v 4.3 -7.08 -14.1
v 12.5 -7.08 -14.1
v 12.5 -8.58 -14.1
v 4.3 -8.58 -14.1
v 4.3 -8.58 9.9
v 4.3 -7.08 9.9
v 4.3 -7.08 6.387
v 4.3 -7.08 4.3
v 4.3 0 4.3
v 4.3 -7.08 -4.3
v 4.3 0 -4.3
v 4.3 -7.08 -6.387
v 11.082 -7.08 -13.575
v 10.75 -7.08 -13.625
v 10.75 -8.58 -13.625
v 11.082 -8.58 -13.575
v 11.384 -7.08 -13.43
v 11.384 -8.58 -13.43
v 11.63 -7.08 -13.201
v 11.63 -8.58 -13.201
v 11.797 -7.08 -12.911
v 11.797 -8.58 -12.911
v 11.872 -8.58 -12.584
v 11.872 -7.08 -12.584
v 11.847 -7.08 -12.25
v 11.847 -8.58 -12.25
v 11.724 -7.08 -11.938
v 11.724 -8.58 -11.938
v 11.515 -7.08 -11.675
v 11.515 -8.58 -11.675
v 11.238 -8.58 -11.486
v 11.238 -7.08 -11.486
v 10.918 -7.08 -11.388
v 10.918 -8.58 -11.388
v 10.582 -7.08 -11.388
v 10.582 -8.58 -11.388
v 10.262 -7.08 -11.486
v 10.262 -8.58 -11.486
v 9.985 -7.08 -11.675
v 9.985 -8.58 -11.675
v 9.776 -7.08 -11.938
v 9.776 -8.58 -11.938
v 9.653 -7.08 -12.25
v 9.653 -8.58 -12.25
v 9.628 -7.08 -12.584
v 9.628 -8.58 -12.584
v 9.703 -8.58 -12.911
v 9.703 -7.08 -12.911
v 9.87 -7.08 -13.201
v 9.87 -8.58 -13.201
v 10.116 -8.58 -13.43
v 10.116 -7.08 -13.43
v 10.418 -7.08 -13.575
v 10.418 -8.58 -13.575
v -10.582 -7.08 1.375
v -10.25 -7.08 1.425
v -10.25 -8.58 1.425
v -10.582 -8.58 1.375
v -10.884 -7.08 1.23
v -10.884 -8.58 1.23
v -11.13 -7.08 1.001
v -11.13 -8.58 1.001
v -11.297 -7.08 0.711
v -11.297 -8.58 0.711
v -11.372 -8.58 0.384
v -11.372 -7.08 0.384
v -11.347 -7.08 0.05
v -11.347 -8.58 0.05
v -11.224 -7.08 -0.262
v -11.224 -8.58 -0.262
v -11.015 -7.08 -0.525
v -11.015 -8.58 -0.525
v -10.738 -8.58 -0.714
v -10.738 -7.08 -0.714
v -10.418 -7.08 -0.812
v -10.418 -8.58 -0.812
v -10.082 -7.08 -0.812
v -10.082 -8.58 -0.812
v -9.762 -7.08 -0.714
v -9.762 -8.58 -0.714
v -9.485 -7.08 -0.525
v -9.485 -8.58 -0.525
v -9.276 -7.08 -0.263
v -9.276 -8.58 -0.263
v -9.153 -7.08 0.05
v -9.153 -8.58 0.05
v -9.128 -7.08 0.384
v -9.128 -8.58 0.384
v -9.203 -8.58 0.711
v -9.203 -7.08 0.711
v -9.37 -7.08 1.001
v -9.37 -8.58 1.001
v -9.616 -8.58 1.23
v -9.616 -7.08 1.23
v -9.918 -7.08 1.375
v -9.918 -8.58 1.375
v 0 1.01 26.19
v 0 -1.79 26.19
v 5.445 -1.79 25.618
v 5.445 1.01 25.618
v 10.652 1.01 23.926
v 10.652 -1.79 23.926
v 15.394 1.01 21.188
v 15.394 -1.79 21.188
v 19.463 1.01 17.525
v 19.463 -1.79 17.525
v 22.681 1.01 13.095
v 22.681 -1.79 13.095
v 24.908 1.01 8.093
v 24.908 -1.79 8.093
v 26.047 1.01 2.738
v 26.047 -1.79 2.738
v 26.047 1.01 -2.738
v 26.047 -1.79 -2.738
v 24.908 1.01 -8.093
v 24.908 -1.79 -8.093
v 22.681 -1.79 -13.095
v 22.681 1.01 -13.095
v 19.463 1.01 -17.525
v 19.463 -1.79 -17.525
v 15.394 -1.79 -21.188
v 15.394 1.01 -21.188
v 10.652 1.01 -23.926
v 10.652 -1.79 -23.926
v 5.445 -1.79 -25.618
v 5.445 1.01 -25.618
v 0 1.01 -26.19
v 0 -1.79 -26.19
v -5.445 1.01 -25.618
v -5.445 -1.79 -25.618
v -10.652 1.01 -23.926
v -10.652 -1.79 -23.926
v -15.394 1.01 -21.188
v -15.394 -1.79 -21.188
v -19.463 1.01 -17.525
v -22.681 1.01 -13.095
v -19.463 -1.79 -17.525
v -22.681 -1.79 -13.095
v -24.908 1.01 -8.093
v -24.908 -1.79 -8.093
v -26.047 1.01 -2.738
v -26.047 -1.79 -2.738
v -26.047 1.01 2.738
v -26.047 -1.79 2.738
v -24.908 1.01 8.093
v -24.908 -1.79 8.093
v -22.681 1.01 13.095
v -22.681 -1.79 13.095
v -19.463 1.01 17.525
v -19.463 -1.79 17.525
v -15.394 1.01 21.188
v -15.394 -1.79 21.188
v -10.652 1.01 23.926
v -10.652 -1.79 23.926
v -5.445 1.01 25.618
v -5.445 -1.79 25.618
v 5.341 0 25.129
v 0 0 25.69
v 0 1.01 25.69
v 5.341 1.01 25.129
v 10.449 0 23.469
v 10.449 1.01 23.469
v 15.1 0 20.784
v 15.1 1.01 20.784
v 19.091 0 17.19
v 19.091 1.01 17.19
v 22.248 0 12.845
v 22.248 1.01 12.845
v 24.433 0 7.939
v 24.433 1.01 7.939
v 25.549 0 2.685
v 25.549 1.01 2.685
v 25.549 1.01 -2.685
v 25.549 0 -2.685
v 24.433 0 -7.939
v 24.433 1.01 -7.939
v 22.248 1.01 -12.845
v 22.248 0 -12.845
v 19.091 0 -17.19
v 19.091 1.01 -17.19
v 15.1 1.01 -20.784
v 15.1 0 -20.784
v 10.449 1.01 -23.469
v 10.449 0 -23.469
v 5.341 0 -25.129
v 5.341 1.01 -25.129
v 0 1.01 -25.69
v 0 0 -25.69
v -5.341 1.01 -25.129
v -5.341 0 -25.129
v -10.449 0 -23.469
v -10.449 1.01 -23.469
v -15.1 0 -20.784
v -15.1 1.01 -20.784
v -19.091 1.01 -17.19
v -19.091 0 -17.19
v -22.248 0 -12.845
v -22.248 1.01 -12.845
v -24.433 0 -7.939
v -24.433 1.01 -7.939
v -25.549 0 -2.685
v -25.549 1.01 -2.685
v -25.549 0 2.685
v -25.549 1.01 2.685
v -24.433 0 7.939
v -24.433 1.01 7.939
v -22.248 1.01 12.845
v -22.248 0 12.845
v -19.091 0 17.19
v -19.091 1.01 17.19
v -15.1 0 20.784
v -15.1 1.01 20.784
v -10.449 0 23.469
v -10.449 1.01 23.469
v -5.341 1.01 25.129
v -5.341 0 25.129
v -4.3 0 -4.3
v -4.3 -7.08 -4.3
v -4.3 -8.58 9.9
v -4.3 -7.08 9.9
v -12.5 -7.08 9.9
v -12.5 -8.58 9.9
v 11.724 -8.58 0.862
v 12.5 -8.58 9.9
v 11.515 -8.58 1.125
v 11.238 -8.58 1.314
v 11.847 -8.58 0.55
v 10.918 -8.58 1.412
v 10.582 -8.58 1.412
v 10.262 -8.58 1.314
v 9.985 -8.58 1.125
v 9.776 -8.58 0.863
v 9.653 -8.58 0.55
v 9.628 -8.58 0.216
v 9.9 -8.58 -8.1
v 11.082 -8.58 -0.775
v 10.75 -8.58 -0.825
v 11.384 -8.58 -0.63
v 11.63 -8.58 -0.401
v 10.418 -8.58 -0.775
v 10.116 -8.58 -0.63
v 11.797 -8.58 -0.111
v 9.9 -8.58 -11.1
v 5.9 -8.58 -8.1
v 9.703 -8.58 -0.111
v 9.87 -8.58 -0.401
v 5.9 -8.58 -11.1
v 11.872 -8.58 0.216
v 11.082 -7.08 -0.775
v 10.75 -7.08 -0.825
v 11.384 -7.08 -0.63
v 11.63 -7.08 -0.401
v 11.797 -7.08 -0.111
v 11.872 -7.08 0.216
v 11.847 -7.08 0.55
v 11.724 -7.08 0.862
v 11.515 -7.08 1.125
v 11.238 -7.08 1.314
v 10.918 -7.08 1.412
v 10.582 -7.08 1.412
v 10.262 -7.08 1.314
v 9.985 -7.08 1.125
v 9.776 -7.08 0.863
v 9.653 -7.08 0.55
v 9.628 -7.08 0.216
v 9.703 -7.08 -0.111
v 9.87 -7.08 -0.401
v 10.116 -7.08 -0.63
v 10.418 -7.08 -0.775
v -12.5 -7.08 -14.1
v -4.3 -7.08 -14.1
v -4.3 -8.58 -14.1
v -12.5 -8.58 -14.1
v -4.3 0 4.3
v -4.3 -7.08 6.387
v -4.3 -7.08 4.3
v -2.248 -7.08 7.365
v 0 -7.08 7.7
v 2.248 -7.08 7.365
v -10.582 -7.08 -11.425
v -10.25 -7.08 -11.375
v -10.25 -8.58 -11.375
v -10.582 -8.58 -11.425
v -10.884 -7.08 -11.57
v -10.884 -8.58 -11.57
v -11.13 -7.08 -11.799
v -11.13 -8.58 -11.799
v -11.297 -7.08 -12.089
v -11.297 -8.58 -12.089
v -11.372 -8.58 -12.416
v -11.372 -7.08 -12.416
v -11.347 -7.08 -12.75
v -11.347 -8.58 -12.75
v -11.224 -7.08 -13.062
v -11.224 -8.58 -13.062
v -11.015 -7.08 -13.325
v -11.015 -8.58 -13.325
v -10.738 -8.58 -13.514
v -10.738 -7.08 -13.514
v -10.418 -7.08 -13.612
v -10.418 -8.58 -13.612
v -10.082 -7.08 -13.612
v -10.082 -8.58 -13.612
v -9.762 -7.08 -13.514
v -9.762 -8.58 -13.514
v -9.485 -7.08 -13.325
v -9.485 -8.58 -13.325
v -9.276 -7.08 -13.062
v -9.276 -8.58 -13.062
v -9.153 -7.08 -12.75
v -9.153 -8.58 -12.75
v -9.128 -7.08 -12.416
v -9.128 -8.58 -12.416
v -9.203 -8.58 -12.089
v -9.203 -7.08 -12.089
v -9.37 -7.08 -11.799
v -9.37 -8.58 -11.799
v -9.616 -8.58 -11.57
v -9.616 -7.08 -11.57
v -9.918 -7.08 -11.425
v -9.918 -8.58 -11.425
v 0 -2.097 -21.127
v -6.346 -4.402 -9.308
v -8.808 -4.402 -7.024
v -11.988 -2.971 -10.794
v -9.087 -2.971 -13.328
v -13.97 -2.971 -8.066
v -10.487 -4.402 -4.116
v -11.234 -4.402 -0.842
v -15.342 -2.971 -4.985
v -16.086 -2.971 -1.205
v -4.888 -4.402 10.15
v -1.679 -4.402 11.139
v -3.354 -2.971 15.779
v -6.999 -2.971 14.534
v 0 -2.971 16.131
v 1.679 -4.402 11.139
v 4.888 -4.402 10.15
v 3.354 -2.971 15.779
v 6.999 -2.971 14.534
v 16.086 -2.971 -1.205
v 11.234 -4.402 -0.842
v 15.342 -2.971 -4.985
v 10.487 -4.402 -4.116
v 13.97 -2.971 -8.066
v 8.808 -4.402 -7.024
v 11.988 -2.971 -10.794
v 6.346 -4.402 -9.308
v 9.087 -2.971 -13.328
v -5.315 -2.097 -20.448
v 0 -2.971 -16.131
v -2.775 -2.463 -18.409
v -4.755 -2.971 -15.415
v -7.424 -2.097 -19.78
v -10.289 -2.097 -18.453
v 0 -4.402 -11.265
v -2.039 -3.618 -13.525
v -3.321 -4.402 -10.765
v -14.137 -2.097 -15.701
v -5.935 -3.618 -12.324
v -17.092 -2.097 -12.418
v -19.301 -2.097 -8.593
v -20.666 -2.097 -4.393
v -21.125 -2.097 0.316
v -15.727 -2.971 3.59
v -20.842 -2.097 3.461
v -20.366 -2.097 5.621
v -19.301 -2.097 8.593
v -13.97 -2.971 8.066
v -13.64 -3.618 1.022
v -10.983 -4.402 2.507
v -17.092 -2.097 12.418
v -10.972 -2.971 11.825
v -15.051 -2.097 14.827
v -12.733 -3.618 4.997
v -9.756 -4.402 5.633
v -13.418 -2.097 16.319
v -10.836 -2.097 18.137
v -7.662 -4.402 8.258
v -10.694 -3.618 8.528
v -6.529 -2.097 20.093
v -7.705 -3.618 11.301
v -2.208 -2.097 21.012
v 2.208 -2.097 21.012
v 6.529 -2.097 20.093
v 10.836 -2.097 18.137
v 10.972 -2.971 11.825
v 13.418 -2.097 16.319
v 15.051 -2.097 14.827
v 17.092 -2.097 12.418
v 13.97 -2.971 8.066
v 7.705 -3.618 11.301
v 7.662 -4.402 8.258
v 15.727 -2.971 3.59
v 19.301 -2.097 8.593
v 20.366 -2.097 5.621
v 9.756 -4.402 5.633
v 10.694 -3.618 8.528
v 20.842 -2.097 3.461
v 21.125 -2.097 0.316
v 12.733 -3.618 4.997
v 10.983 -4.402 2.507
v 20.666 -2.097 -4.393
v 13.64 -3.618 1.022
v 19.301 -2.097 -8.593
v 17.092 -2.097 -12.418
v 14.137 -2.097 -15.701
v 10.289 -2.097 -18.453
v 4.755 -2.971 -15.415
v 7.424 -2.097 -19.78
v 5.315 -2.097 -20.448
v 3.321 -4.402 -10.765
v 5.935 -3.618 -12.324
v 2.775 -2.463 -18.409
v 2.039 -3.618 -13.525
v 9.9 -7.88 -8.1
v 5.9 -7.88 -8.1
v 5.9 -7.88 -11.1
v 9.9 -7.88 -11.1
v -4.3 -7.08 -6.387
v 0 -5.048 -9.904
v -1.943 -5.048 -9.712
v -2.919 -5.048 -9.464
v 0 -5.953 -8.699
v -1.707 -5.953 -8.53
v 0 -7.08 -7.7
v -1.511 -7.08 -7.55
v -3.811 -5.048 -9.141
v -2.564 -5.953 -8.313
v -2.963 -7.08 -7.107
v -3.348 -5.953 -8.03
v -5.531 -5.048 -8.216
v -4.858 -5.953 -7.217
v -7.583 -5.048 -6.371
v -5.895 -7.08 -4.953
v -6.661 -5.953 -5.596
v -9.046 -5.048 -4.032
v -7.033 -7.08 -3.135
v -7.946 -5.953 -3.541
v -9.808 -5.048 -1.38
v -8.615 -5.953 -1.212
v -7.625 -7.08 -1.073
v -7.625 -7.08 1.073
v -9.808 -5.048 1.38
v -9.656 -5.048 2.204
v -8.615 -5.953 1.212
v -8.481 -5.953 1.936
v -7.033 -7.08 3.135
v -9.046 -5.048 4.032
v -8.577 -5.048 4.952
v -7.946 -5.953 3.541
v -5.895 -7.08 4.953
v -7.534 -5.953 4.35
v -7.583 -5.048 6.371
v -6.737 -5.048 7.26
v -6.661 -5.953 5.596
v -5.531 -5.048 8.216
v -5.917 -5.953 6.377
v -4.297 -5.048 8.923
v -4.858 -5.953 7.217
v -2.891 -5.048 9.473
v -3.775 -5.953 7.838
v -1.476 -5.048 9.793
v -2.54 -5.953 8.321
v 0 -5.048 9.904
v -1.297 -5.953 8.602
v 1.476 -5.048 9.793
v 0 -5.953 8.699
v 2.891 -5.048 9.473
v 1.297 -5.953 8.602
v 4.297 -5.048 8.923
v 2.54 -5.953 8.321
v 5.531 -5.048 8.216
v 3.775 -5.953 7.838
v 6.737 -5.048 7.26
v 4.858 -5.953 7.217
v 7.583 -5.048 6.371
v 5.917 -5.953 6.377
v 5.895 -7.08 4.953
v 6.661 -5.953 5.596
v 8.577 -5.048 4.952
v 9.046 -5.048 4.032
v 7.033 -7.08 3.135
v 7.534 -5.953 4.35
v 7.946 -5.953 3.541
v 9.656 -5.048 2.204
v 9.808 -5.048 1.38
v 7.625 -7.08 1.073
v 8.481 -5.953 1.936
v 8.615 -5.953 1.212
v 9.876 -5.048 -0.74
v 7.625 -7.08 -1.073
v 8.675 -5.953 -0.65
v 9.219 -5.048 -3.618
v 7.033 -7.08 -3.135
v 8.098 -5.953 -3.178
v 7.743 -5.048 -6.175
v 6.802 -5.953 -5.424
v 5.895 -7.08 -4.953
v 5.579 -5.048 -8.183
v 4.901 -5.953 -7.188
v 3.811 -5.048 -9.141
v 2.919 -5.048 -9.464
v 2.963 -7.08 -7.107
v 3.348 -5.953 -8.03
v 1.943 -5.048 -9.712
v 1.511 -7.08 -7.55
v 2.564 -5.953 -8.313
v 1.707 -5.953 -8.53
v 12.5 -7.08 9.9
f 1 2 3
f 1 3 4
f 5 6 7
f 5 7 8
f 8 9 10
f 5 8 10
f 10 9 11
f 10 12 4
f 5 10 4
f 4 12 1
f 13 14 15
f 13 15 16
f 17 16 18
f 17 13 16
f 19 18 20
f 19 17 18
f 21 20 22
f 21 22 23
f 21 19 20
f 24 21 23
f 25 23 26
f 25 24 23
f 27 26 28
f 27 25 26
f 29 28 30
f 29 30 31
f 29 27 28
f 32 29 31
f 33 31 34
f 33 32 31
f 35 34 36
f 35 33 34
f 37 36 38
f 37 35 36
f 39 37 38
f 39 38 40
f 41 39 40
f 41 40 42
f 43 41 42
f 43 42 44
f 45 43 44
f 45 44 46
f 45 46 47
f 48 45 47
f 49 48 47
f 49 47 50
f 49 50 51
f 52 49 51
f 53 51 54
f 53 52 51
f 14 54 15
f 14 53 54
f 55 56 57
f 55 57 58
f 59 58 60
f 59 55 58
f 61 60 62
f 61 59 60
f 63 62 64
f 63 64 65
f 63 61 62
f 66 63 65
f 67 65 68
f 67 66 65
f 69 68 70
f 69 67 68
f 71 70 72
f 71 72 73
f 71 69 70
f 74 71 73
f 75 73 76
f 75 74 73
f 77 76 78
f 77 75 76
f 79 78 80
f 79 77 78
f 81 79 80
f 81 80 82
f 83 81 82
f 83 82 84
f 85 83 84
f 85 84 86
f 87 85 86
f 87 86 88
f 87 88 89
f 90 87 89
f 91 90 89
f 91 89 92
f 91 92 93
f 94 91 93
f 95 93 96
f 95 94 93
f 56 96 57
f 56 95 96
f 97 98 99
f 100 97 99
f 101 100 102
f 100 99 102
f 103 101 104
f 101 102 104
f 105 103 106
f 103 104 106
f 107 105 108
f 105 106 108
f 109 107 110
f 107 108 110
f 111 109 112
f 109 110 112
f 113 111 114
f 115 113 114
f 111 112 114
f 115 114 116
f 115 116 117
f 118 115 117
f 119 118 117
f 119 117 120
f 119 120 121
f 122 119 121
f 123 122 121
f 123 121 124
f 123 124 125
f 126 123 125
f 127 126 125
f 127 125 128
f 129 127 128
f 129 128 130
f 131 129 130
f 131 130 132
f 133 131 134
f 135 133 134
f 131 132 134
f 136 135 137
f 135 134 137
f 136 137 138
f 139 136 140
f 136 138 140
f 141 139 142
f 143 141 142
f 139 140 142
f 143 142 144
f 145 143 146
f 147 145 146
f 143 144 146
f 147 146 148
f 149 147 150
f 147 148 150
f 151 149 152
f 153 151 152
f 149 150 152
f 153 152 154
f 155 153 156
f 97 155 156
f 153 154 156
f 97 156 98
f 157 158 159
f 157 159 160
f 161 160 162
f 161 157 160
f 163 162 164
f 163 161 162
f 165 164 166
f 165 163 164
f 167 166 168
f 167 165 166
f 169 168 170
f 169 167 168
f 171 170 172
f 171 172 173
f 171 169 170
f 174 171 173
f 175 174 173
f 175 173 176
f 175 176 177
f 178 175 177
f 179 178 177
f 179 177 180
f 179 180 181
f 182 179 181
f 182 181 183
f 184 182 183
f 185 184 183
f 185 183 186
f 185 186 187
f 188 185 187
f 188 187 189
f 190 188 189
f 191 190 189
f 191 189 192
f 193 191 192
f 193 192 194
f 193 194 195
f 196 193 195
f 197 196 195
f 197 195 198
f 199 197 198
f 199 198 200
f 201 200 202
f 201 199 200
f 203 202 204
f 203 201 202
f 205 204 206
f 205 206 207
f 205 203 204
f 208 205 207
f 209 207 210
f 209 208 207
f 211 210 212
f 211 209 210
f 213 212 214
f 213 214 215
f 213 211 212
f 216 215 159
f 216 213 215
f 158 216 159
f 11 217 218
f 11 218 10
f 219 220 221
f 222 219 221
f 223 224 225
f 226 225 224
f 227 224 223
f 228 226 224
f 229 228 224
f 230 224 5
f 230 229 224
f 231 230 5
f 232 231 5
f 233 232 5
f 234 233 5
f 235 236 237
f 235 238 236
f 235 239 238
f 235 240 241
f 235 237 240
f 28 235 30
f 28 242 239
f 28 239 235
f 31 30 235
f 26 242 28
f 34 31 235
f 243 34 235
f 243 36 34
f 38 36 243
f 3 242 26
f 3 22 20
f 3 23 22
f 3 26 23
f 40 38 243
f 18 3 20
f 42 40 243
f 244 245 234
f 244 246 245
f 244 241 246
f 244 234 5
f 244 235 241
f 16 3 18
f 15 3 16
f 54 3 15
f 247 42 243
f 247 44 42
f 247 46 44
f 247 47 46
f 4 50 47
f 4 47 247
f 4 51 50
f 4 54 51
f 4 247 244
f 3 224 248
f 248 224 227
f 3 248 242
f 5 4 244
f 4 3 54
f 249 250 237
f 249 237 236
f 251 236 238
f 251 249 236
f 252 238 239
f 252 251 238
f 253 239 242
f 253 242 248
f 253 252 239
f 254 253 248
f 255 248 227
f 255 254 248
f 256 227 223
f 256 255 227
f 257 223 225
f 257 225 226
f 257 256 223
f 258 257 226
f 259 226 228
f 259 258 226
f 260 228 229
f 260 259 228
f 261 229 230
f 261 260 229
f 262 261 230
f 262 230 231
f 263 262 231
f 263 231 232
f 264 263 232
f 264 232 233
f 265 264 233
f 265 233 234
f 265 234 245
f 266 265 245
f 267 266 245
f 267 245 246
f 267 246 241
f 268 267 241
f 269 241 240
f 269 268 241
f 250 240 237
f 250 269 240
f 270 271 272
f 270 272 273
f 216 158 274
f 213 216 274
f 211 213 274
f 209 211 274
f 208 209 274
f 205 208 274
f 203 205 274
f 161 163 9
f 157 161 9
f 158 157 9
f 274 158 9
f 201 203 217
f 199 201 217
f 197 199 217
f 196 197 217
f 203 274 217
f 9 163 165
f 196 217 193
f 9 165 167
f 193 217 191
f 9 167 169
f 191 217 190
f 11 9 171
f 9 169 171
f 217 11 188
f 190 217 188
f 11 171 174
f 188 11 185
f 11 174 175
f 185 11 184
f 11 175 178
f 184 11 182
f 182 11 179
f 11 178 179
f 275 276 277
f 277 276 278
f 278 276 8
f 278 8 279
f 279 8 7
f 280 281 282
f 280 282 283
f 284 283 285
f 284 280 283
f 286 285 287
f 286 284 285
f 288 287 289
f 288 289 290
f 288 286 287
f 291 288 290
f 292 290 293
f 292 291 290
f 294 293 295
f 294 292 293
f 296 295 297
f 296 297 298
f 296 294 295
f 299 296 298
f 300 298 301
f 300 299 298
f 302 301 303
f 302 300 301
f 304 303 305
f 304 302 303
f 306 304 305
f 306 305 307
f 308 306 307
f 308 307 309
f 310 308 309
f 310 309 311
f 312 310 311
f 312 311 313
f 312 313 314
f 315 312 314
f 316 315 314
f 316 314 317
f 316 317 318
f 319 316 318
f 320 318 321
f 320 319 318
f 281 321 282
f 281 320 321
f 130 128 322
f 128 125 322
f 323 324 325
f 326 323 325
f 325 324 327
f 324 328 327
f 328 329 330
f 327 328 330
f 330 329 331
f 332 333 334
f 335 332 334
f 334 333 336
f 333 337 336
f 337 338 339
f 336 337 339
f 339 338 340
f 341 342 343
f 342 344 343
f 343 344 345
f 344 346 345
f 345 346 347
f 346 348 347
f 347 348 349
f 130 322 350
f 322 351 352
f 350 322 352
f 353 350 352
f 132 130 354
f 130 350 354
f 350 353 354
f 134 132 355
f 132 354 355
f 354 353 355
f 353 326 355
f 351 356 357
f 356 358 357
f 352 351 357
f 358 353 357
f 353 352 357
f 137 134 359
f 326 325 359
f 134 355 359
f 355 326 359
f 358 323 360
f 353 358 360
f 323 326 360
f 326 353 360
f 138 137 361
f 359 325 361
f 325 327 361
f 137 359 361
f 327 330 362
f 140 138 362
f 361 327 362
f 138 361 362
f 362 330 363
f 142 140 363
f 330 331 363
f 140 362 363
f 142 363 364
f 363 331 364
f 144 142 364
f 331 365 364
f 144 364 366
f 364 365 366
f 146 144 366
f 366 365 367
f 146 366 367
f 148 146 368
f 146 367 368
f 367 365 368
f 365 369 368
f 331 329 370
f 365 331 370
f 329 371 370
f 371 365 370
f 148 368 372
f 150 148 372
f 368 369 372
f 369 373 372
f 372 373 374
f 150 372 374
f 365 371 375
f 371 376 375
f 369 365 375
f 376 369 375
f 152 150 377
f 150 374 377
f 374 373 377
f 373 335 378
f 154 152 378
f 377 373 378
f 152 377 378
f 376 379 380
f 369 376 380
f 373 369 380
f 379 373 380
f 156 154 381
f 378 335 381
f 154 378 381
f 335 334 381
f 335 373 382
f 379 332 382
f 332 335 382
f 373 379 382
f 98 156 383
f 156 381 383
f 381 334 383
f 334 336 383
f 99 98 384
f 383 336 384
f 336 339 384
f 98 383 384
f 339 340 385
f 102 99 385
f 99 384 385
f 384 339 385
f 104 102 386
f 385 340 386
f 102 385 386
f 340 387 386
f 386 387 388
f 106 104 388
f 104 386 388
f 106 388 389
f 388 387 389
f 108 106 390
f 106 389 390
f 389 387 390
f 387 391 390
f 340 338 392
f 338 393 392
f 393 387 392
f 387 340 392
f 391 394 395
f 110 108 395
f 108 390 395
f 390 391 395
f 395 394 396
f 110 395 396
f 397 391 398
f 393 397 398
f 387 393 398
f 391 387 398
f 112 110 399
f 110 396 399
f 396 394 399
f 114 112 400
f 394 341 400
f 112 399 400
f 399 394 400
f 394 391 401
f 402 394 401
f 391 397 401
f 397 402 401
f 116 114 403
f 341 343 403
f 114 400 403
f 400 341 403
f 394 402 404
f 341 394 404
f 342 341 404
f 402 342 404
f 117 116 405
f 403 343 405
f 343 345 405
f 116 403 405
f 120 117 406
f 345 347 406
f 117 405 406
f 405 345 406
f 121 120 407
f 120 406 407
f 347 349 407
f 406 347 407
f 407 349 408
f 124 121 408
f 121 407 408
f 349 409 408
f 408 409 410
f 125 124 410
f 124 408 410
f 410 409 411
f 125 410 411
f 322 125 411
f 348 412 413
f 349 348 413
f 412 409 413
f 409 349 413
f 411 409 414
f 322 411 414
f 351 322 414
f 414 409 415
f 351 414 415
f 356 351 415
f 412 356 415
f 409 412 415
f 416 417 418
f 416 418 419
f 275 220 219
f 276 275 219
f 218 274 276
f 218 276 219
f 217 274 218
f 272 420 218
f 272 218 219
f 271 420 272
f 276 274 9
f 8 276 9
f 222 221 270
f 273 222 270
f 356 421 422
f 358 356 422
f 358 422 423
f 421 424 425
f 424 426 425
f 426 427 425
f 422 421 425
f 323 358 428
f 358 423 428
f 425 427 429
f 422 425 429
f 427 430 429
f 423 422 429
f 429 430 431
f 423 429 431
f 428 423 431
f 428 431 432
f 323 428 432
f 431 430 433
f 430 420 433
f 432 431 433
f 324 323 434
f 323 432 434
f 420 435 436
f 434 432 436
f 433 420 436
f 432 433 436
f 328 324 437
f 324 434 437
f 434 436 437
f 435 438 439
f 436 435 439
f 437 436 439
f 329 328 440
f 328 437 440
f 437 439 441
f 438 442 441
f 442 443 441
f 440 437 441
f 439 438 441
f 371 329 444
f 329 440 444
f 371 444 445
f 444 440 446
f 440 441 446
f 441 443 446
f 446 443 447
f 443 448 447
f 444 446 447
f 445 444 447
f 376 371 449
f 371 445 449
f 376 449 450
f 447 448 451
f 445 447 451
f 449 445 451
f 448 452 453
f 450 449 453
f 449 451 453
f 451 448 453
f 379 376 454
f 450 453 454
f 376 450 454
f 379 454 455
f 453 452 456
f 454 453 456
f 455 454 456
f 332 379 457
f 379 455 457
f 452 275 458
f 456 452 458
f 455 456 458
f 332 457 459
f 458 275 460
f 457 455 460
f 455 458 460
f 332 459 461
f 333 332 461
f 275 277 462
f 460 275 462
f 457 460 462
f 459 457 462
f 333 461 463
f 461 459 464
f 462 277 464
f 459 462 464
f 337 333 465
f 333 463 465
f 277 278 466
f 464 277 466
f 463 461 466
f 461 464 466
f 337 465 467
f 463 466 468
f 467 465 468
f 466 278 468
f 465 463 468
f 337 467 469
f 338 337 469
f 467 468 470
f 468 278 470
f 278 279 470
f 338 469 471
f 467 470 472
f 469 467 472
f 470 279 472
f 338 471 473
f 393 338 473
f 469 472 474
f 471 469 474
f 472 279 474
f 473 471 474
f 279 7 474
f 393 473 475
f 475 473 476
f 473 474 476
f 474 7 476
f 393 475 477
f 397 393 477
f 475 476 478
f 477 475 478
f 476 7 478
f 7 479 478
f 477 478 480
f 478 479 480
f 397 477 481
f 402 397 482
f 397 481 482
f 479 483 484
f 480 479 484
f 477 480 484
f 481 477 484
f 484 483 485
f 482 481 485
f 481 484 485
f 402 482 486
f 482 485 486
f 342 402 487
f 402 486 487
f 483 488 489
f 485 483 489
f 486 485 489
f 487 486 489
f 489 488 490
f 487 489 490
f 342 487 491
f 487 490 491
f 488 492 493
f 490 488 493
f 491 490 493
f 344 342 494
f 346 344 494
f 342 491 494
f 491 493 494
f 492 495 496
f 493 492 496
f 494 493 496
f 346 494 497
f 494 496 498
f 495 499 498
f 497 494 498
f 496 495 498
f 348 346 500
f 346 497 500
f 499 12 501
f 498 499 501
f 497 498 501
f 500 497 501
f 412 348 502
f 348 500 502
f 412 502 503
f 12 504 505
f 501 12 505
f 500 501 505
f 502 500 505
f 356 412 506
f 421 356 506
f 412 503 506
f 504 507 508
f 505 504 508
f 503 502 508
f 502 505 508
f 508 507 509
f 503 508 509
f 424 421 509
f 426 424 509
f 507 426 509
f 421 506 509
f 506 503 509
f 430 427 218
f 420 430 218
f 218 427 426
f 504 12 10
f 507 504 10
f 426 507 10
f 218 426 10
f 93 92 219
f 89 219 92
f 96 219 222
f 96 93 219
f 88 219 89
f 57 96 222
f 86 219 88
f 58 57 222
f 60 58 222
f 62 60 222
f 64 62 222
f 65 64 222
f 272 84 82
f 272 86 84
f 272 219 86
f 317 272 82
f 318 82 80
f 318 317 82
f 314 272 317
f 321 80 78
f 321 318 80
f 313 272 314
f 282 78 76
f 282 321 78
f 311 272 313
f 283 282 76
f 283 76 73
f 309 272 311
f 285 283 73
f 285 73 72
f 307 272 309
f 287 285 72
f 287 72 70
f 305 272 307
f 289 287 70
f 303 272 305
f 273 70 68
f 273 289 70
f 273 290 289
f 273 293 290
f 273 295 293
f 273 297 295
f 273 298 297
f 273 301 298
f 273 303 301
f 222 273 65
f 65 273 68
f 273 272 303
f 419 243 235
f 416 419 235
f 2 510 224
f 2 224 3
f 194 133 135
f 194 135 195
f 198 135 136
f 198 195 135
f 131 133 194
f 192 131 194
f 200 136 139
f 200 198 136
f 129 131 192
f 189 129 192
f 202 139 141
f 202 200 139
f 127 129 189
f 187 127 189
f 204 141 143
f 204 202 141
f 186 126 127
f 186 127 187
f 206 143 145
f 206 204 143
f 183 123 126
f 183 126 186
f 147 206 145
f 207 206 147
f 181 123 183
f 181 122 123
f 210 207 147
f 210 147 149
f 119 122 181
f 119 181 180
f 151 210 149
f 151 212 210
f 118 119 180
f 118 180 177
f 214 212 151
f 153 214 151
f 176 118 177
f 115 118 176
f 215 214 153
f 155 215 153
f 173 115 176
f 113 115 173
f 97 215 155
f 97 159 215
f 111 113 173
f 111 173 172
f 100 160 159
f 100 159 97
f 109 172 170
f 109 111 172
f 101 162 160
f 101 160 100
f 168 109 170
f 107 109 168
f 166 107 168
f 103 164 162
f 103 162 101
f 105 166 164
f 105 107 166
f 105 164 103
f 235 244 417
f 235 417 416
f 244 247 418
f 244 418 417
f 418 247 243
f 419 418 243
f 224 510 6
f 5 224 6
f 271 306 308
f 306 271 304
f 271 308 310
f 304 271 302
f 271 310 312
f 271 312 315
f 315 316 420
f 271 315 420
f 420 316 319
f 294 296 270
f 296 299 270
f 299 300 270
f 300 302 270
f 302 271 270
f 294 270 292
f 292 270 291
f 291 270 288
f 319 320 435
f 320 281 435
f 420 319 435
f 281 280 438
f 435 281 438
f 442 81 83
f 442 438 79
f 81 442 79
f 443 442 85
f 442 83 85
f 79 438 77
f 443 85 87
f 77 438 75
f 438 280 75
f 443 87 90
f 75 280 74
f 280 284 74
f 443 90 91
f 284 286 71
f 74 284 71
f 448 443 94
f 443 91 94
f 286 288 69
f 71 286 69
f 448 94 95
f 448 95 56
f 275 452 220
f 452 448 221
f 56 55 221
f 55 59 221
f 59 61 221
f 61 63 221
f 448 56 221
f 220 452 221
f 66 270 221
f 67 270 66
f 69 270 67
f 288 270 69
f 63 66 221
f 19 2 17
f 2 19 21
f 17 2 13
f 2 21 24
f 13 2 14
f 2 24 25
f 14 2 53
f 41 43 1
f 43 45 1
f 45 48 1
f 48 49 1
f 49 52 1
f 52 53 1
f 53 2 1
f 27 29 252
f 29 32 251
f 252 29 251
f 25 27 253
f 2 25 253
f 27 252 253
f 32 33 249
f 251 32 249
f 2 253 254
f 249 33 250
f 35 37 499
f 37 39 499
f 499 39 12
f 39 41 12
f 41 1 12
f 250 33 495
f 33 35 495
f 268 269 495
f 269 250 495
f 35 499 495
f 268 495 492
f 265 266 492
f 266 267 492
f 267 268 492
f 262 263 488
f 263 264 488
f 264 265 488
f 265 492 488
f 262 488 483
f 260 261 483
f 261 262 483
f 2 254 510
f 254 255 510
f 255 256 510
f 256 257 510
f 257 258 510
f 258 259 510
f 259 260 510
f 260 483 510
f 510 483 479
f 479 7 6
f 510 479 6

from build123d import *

# Parameters (mm, degrees)
SKETCH7_R             = 25.69
SKETCH7_W             = 8.6
SKETCH7_H             = 8.6
LENS_SPACER_DEPTH     = 7.08
SKETCH5_W             = 8.2
SKETCH5_H             = 24
SKETCH5_R             = 1.125
ATTACHMENT_LEGS_DEPTH = 1.5
LENS_START            = -7.08
SKETCH8_R             = 26.19
SKETCH8_R_2           = 25.69
LENS_POSITIONER_DEPTH = 8.09
SKETCH11_W            = 4
SKETCH11_H            = 3
NODE_HOLE_DEPTH       = 0.7


with BuildPart() as part:
    # Sketch7 → Lens Spacer (new body)
    with BuildSketch(Plane.XZ):
        with Locations(Location((0, 0, 0), (0, 0, 270))):
            Circle(SKETCH7_R)
        Rectangle(SKETCH7_W, SKETCH7_H, mode=Mode.SUBTRACT)
    extrude(amount=LENS_SPACER_DEPTH)

    # Sketch5 → Attachment Legs (add)
    # profile 1 of 2: a face of its own
    with BuildSketch(Plane(origin=(0, -7.08, 0), x_dir=(-1, 0, 0), z_dir=(0, -1, 0))):
        with Locations((-8.4, 2.1)):
            Rectangle(SKETCH5_W, SKETCH5_H)
        with Locations(Location((-10.75, 12.5, 0), (0, 0, 90))):
            Circle(SKETCH5_R, mode=Mode.SUBTRACT)
        with Locations(Location((-10.75, -0.3, 0), (0, 0, 90))):
            Circle(SKETCH5_R, mode=Mode.SUBTRACT)
    # profile 2 of 2: a face of its own
    with BuildSketch(Plane(origin=(0, -7.08, 0), x_dir=(-1, 0, 0), z_dir=(0, -1, 0))):
        with Locations((8.4, 2.1)):
            Rectangle(SKETCH5_W, SKETCH5_H)
        with Locations(Location((10.25, -0.3, 0), (0, 0, 270))):
            Circle(SKETCH5_R, mode=Mode.SUBTRACT)
        with Locations(Location((10.25, 12.5, 0), (0, 0, 270))):
            Circle(SKETCH5_R, mode=Mode.SUBTRACT)
    extrude(amount=ATTACHMENT_LEGS_DEPTH)

    # Sketch8 → Lens Positioner (add)
    with BuildSketch(Plane(origin=(0, 0, 0), x_dir=(1, 0, 0), z_dir=(0, 1, 0)).offset(LENS_START)):
        with Locations(Location((0, 0, 0), (0, 0, 270))):
            Circle(SKETCH8_R)
        with Locations(Location((0, 0, 0), (0, 0, 270))):
            Circle(SKETCH8_R_2, mode=Mode.SUBTRACT)
    extrude(amount=LENS_POSITIONER_DEPTH)

    # Sketch11 → Node Hole (cut)
    with BuildSketch(Plane.XZ.offset(8.58)):
        with Locations((7.9, -9.6)):
            Rectangle(SKETCH11_W, SKETCH11_H)
    extrude(amount=-NODE_HOLE_DEPTH, mode=Mode.SUBTRACT)

    # Sketch13 → Cut-Revolve1 (revolve, cut)
    with BuildSketch(Plane.XY, mode=Mode.PRIVATE) as cut_revolve1_sk:
        with BuildLine():
            Line((-7.7, -7.08), (-26.19, -7.08))
            Line((-26.19, -7.08), (-26.19, -1.79))
            ThreePointArc((-26.19, -1.79), (-18.616939408, -2.463282886), (-11.265314293, -4.401881538))
            ThreePointArc((-11.265314293, -4.401881538), (-9.27901976, -5.469843244), (-7.7, -7.08))
        make_face()
    revolve(cut_revolve1_sk.sketch.rotate(Axis((0, -81.156506397, 0), (0, 1, 0)), 270), axis=Axis((0, -81.156506397, 0), (0, 1, 0)), mode=Mode.SUBTRACT)


solid = part.part
